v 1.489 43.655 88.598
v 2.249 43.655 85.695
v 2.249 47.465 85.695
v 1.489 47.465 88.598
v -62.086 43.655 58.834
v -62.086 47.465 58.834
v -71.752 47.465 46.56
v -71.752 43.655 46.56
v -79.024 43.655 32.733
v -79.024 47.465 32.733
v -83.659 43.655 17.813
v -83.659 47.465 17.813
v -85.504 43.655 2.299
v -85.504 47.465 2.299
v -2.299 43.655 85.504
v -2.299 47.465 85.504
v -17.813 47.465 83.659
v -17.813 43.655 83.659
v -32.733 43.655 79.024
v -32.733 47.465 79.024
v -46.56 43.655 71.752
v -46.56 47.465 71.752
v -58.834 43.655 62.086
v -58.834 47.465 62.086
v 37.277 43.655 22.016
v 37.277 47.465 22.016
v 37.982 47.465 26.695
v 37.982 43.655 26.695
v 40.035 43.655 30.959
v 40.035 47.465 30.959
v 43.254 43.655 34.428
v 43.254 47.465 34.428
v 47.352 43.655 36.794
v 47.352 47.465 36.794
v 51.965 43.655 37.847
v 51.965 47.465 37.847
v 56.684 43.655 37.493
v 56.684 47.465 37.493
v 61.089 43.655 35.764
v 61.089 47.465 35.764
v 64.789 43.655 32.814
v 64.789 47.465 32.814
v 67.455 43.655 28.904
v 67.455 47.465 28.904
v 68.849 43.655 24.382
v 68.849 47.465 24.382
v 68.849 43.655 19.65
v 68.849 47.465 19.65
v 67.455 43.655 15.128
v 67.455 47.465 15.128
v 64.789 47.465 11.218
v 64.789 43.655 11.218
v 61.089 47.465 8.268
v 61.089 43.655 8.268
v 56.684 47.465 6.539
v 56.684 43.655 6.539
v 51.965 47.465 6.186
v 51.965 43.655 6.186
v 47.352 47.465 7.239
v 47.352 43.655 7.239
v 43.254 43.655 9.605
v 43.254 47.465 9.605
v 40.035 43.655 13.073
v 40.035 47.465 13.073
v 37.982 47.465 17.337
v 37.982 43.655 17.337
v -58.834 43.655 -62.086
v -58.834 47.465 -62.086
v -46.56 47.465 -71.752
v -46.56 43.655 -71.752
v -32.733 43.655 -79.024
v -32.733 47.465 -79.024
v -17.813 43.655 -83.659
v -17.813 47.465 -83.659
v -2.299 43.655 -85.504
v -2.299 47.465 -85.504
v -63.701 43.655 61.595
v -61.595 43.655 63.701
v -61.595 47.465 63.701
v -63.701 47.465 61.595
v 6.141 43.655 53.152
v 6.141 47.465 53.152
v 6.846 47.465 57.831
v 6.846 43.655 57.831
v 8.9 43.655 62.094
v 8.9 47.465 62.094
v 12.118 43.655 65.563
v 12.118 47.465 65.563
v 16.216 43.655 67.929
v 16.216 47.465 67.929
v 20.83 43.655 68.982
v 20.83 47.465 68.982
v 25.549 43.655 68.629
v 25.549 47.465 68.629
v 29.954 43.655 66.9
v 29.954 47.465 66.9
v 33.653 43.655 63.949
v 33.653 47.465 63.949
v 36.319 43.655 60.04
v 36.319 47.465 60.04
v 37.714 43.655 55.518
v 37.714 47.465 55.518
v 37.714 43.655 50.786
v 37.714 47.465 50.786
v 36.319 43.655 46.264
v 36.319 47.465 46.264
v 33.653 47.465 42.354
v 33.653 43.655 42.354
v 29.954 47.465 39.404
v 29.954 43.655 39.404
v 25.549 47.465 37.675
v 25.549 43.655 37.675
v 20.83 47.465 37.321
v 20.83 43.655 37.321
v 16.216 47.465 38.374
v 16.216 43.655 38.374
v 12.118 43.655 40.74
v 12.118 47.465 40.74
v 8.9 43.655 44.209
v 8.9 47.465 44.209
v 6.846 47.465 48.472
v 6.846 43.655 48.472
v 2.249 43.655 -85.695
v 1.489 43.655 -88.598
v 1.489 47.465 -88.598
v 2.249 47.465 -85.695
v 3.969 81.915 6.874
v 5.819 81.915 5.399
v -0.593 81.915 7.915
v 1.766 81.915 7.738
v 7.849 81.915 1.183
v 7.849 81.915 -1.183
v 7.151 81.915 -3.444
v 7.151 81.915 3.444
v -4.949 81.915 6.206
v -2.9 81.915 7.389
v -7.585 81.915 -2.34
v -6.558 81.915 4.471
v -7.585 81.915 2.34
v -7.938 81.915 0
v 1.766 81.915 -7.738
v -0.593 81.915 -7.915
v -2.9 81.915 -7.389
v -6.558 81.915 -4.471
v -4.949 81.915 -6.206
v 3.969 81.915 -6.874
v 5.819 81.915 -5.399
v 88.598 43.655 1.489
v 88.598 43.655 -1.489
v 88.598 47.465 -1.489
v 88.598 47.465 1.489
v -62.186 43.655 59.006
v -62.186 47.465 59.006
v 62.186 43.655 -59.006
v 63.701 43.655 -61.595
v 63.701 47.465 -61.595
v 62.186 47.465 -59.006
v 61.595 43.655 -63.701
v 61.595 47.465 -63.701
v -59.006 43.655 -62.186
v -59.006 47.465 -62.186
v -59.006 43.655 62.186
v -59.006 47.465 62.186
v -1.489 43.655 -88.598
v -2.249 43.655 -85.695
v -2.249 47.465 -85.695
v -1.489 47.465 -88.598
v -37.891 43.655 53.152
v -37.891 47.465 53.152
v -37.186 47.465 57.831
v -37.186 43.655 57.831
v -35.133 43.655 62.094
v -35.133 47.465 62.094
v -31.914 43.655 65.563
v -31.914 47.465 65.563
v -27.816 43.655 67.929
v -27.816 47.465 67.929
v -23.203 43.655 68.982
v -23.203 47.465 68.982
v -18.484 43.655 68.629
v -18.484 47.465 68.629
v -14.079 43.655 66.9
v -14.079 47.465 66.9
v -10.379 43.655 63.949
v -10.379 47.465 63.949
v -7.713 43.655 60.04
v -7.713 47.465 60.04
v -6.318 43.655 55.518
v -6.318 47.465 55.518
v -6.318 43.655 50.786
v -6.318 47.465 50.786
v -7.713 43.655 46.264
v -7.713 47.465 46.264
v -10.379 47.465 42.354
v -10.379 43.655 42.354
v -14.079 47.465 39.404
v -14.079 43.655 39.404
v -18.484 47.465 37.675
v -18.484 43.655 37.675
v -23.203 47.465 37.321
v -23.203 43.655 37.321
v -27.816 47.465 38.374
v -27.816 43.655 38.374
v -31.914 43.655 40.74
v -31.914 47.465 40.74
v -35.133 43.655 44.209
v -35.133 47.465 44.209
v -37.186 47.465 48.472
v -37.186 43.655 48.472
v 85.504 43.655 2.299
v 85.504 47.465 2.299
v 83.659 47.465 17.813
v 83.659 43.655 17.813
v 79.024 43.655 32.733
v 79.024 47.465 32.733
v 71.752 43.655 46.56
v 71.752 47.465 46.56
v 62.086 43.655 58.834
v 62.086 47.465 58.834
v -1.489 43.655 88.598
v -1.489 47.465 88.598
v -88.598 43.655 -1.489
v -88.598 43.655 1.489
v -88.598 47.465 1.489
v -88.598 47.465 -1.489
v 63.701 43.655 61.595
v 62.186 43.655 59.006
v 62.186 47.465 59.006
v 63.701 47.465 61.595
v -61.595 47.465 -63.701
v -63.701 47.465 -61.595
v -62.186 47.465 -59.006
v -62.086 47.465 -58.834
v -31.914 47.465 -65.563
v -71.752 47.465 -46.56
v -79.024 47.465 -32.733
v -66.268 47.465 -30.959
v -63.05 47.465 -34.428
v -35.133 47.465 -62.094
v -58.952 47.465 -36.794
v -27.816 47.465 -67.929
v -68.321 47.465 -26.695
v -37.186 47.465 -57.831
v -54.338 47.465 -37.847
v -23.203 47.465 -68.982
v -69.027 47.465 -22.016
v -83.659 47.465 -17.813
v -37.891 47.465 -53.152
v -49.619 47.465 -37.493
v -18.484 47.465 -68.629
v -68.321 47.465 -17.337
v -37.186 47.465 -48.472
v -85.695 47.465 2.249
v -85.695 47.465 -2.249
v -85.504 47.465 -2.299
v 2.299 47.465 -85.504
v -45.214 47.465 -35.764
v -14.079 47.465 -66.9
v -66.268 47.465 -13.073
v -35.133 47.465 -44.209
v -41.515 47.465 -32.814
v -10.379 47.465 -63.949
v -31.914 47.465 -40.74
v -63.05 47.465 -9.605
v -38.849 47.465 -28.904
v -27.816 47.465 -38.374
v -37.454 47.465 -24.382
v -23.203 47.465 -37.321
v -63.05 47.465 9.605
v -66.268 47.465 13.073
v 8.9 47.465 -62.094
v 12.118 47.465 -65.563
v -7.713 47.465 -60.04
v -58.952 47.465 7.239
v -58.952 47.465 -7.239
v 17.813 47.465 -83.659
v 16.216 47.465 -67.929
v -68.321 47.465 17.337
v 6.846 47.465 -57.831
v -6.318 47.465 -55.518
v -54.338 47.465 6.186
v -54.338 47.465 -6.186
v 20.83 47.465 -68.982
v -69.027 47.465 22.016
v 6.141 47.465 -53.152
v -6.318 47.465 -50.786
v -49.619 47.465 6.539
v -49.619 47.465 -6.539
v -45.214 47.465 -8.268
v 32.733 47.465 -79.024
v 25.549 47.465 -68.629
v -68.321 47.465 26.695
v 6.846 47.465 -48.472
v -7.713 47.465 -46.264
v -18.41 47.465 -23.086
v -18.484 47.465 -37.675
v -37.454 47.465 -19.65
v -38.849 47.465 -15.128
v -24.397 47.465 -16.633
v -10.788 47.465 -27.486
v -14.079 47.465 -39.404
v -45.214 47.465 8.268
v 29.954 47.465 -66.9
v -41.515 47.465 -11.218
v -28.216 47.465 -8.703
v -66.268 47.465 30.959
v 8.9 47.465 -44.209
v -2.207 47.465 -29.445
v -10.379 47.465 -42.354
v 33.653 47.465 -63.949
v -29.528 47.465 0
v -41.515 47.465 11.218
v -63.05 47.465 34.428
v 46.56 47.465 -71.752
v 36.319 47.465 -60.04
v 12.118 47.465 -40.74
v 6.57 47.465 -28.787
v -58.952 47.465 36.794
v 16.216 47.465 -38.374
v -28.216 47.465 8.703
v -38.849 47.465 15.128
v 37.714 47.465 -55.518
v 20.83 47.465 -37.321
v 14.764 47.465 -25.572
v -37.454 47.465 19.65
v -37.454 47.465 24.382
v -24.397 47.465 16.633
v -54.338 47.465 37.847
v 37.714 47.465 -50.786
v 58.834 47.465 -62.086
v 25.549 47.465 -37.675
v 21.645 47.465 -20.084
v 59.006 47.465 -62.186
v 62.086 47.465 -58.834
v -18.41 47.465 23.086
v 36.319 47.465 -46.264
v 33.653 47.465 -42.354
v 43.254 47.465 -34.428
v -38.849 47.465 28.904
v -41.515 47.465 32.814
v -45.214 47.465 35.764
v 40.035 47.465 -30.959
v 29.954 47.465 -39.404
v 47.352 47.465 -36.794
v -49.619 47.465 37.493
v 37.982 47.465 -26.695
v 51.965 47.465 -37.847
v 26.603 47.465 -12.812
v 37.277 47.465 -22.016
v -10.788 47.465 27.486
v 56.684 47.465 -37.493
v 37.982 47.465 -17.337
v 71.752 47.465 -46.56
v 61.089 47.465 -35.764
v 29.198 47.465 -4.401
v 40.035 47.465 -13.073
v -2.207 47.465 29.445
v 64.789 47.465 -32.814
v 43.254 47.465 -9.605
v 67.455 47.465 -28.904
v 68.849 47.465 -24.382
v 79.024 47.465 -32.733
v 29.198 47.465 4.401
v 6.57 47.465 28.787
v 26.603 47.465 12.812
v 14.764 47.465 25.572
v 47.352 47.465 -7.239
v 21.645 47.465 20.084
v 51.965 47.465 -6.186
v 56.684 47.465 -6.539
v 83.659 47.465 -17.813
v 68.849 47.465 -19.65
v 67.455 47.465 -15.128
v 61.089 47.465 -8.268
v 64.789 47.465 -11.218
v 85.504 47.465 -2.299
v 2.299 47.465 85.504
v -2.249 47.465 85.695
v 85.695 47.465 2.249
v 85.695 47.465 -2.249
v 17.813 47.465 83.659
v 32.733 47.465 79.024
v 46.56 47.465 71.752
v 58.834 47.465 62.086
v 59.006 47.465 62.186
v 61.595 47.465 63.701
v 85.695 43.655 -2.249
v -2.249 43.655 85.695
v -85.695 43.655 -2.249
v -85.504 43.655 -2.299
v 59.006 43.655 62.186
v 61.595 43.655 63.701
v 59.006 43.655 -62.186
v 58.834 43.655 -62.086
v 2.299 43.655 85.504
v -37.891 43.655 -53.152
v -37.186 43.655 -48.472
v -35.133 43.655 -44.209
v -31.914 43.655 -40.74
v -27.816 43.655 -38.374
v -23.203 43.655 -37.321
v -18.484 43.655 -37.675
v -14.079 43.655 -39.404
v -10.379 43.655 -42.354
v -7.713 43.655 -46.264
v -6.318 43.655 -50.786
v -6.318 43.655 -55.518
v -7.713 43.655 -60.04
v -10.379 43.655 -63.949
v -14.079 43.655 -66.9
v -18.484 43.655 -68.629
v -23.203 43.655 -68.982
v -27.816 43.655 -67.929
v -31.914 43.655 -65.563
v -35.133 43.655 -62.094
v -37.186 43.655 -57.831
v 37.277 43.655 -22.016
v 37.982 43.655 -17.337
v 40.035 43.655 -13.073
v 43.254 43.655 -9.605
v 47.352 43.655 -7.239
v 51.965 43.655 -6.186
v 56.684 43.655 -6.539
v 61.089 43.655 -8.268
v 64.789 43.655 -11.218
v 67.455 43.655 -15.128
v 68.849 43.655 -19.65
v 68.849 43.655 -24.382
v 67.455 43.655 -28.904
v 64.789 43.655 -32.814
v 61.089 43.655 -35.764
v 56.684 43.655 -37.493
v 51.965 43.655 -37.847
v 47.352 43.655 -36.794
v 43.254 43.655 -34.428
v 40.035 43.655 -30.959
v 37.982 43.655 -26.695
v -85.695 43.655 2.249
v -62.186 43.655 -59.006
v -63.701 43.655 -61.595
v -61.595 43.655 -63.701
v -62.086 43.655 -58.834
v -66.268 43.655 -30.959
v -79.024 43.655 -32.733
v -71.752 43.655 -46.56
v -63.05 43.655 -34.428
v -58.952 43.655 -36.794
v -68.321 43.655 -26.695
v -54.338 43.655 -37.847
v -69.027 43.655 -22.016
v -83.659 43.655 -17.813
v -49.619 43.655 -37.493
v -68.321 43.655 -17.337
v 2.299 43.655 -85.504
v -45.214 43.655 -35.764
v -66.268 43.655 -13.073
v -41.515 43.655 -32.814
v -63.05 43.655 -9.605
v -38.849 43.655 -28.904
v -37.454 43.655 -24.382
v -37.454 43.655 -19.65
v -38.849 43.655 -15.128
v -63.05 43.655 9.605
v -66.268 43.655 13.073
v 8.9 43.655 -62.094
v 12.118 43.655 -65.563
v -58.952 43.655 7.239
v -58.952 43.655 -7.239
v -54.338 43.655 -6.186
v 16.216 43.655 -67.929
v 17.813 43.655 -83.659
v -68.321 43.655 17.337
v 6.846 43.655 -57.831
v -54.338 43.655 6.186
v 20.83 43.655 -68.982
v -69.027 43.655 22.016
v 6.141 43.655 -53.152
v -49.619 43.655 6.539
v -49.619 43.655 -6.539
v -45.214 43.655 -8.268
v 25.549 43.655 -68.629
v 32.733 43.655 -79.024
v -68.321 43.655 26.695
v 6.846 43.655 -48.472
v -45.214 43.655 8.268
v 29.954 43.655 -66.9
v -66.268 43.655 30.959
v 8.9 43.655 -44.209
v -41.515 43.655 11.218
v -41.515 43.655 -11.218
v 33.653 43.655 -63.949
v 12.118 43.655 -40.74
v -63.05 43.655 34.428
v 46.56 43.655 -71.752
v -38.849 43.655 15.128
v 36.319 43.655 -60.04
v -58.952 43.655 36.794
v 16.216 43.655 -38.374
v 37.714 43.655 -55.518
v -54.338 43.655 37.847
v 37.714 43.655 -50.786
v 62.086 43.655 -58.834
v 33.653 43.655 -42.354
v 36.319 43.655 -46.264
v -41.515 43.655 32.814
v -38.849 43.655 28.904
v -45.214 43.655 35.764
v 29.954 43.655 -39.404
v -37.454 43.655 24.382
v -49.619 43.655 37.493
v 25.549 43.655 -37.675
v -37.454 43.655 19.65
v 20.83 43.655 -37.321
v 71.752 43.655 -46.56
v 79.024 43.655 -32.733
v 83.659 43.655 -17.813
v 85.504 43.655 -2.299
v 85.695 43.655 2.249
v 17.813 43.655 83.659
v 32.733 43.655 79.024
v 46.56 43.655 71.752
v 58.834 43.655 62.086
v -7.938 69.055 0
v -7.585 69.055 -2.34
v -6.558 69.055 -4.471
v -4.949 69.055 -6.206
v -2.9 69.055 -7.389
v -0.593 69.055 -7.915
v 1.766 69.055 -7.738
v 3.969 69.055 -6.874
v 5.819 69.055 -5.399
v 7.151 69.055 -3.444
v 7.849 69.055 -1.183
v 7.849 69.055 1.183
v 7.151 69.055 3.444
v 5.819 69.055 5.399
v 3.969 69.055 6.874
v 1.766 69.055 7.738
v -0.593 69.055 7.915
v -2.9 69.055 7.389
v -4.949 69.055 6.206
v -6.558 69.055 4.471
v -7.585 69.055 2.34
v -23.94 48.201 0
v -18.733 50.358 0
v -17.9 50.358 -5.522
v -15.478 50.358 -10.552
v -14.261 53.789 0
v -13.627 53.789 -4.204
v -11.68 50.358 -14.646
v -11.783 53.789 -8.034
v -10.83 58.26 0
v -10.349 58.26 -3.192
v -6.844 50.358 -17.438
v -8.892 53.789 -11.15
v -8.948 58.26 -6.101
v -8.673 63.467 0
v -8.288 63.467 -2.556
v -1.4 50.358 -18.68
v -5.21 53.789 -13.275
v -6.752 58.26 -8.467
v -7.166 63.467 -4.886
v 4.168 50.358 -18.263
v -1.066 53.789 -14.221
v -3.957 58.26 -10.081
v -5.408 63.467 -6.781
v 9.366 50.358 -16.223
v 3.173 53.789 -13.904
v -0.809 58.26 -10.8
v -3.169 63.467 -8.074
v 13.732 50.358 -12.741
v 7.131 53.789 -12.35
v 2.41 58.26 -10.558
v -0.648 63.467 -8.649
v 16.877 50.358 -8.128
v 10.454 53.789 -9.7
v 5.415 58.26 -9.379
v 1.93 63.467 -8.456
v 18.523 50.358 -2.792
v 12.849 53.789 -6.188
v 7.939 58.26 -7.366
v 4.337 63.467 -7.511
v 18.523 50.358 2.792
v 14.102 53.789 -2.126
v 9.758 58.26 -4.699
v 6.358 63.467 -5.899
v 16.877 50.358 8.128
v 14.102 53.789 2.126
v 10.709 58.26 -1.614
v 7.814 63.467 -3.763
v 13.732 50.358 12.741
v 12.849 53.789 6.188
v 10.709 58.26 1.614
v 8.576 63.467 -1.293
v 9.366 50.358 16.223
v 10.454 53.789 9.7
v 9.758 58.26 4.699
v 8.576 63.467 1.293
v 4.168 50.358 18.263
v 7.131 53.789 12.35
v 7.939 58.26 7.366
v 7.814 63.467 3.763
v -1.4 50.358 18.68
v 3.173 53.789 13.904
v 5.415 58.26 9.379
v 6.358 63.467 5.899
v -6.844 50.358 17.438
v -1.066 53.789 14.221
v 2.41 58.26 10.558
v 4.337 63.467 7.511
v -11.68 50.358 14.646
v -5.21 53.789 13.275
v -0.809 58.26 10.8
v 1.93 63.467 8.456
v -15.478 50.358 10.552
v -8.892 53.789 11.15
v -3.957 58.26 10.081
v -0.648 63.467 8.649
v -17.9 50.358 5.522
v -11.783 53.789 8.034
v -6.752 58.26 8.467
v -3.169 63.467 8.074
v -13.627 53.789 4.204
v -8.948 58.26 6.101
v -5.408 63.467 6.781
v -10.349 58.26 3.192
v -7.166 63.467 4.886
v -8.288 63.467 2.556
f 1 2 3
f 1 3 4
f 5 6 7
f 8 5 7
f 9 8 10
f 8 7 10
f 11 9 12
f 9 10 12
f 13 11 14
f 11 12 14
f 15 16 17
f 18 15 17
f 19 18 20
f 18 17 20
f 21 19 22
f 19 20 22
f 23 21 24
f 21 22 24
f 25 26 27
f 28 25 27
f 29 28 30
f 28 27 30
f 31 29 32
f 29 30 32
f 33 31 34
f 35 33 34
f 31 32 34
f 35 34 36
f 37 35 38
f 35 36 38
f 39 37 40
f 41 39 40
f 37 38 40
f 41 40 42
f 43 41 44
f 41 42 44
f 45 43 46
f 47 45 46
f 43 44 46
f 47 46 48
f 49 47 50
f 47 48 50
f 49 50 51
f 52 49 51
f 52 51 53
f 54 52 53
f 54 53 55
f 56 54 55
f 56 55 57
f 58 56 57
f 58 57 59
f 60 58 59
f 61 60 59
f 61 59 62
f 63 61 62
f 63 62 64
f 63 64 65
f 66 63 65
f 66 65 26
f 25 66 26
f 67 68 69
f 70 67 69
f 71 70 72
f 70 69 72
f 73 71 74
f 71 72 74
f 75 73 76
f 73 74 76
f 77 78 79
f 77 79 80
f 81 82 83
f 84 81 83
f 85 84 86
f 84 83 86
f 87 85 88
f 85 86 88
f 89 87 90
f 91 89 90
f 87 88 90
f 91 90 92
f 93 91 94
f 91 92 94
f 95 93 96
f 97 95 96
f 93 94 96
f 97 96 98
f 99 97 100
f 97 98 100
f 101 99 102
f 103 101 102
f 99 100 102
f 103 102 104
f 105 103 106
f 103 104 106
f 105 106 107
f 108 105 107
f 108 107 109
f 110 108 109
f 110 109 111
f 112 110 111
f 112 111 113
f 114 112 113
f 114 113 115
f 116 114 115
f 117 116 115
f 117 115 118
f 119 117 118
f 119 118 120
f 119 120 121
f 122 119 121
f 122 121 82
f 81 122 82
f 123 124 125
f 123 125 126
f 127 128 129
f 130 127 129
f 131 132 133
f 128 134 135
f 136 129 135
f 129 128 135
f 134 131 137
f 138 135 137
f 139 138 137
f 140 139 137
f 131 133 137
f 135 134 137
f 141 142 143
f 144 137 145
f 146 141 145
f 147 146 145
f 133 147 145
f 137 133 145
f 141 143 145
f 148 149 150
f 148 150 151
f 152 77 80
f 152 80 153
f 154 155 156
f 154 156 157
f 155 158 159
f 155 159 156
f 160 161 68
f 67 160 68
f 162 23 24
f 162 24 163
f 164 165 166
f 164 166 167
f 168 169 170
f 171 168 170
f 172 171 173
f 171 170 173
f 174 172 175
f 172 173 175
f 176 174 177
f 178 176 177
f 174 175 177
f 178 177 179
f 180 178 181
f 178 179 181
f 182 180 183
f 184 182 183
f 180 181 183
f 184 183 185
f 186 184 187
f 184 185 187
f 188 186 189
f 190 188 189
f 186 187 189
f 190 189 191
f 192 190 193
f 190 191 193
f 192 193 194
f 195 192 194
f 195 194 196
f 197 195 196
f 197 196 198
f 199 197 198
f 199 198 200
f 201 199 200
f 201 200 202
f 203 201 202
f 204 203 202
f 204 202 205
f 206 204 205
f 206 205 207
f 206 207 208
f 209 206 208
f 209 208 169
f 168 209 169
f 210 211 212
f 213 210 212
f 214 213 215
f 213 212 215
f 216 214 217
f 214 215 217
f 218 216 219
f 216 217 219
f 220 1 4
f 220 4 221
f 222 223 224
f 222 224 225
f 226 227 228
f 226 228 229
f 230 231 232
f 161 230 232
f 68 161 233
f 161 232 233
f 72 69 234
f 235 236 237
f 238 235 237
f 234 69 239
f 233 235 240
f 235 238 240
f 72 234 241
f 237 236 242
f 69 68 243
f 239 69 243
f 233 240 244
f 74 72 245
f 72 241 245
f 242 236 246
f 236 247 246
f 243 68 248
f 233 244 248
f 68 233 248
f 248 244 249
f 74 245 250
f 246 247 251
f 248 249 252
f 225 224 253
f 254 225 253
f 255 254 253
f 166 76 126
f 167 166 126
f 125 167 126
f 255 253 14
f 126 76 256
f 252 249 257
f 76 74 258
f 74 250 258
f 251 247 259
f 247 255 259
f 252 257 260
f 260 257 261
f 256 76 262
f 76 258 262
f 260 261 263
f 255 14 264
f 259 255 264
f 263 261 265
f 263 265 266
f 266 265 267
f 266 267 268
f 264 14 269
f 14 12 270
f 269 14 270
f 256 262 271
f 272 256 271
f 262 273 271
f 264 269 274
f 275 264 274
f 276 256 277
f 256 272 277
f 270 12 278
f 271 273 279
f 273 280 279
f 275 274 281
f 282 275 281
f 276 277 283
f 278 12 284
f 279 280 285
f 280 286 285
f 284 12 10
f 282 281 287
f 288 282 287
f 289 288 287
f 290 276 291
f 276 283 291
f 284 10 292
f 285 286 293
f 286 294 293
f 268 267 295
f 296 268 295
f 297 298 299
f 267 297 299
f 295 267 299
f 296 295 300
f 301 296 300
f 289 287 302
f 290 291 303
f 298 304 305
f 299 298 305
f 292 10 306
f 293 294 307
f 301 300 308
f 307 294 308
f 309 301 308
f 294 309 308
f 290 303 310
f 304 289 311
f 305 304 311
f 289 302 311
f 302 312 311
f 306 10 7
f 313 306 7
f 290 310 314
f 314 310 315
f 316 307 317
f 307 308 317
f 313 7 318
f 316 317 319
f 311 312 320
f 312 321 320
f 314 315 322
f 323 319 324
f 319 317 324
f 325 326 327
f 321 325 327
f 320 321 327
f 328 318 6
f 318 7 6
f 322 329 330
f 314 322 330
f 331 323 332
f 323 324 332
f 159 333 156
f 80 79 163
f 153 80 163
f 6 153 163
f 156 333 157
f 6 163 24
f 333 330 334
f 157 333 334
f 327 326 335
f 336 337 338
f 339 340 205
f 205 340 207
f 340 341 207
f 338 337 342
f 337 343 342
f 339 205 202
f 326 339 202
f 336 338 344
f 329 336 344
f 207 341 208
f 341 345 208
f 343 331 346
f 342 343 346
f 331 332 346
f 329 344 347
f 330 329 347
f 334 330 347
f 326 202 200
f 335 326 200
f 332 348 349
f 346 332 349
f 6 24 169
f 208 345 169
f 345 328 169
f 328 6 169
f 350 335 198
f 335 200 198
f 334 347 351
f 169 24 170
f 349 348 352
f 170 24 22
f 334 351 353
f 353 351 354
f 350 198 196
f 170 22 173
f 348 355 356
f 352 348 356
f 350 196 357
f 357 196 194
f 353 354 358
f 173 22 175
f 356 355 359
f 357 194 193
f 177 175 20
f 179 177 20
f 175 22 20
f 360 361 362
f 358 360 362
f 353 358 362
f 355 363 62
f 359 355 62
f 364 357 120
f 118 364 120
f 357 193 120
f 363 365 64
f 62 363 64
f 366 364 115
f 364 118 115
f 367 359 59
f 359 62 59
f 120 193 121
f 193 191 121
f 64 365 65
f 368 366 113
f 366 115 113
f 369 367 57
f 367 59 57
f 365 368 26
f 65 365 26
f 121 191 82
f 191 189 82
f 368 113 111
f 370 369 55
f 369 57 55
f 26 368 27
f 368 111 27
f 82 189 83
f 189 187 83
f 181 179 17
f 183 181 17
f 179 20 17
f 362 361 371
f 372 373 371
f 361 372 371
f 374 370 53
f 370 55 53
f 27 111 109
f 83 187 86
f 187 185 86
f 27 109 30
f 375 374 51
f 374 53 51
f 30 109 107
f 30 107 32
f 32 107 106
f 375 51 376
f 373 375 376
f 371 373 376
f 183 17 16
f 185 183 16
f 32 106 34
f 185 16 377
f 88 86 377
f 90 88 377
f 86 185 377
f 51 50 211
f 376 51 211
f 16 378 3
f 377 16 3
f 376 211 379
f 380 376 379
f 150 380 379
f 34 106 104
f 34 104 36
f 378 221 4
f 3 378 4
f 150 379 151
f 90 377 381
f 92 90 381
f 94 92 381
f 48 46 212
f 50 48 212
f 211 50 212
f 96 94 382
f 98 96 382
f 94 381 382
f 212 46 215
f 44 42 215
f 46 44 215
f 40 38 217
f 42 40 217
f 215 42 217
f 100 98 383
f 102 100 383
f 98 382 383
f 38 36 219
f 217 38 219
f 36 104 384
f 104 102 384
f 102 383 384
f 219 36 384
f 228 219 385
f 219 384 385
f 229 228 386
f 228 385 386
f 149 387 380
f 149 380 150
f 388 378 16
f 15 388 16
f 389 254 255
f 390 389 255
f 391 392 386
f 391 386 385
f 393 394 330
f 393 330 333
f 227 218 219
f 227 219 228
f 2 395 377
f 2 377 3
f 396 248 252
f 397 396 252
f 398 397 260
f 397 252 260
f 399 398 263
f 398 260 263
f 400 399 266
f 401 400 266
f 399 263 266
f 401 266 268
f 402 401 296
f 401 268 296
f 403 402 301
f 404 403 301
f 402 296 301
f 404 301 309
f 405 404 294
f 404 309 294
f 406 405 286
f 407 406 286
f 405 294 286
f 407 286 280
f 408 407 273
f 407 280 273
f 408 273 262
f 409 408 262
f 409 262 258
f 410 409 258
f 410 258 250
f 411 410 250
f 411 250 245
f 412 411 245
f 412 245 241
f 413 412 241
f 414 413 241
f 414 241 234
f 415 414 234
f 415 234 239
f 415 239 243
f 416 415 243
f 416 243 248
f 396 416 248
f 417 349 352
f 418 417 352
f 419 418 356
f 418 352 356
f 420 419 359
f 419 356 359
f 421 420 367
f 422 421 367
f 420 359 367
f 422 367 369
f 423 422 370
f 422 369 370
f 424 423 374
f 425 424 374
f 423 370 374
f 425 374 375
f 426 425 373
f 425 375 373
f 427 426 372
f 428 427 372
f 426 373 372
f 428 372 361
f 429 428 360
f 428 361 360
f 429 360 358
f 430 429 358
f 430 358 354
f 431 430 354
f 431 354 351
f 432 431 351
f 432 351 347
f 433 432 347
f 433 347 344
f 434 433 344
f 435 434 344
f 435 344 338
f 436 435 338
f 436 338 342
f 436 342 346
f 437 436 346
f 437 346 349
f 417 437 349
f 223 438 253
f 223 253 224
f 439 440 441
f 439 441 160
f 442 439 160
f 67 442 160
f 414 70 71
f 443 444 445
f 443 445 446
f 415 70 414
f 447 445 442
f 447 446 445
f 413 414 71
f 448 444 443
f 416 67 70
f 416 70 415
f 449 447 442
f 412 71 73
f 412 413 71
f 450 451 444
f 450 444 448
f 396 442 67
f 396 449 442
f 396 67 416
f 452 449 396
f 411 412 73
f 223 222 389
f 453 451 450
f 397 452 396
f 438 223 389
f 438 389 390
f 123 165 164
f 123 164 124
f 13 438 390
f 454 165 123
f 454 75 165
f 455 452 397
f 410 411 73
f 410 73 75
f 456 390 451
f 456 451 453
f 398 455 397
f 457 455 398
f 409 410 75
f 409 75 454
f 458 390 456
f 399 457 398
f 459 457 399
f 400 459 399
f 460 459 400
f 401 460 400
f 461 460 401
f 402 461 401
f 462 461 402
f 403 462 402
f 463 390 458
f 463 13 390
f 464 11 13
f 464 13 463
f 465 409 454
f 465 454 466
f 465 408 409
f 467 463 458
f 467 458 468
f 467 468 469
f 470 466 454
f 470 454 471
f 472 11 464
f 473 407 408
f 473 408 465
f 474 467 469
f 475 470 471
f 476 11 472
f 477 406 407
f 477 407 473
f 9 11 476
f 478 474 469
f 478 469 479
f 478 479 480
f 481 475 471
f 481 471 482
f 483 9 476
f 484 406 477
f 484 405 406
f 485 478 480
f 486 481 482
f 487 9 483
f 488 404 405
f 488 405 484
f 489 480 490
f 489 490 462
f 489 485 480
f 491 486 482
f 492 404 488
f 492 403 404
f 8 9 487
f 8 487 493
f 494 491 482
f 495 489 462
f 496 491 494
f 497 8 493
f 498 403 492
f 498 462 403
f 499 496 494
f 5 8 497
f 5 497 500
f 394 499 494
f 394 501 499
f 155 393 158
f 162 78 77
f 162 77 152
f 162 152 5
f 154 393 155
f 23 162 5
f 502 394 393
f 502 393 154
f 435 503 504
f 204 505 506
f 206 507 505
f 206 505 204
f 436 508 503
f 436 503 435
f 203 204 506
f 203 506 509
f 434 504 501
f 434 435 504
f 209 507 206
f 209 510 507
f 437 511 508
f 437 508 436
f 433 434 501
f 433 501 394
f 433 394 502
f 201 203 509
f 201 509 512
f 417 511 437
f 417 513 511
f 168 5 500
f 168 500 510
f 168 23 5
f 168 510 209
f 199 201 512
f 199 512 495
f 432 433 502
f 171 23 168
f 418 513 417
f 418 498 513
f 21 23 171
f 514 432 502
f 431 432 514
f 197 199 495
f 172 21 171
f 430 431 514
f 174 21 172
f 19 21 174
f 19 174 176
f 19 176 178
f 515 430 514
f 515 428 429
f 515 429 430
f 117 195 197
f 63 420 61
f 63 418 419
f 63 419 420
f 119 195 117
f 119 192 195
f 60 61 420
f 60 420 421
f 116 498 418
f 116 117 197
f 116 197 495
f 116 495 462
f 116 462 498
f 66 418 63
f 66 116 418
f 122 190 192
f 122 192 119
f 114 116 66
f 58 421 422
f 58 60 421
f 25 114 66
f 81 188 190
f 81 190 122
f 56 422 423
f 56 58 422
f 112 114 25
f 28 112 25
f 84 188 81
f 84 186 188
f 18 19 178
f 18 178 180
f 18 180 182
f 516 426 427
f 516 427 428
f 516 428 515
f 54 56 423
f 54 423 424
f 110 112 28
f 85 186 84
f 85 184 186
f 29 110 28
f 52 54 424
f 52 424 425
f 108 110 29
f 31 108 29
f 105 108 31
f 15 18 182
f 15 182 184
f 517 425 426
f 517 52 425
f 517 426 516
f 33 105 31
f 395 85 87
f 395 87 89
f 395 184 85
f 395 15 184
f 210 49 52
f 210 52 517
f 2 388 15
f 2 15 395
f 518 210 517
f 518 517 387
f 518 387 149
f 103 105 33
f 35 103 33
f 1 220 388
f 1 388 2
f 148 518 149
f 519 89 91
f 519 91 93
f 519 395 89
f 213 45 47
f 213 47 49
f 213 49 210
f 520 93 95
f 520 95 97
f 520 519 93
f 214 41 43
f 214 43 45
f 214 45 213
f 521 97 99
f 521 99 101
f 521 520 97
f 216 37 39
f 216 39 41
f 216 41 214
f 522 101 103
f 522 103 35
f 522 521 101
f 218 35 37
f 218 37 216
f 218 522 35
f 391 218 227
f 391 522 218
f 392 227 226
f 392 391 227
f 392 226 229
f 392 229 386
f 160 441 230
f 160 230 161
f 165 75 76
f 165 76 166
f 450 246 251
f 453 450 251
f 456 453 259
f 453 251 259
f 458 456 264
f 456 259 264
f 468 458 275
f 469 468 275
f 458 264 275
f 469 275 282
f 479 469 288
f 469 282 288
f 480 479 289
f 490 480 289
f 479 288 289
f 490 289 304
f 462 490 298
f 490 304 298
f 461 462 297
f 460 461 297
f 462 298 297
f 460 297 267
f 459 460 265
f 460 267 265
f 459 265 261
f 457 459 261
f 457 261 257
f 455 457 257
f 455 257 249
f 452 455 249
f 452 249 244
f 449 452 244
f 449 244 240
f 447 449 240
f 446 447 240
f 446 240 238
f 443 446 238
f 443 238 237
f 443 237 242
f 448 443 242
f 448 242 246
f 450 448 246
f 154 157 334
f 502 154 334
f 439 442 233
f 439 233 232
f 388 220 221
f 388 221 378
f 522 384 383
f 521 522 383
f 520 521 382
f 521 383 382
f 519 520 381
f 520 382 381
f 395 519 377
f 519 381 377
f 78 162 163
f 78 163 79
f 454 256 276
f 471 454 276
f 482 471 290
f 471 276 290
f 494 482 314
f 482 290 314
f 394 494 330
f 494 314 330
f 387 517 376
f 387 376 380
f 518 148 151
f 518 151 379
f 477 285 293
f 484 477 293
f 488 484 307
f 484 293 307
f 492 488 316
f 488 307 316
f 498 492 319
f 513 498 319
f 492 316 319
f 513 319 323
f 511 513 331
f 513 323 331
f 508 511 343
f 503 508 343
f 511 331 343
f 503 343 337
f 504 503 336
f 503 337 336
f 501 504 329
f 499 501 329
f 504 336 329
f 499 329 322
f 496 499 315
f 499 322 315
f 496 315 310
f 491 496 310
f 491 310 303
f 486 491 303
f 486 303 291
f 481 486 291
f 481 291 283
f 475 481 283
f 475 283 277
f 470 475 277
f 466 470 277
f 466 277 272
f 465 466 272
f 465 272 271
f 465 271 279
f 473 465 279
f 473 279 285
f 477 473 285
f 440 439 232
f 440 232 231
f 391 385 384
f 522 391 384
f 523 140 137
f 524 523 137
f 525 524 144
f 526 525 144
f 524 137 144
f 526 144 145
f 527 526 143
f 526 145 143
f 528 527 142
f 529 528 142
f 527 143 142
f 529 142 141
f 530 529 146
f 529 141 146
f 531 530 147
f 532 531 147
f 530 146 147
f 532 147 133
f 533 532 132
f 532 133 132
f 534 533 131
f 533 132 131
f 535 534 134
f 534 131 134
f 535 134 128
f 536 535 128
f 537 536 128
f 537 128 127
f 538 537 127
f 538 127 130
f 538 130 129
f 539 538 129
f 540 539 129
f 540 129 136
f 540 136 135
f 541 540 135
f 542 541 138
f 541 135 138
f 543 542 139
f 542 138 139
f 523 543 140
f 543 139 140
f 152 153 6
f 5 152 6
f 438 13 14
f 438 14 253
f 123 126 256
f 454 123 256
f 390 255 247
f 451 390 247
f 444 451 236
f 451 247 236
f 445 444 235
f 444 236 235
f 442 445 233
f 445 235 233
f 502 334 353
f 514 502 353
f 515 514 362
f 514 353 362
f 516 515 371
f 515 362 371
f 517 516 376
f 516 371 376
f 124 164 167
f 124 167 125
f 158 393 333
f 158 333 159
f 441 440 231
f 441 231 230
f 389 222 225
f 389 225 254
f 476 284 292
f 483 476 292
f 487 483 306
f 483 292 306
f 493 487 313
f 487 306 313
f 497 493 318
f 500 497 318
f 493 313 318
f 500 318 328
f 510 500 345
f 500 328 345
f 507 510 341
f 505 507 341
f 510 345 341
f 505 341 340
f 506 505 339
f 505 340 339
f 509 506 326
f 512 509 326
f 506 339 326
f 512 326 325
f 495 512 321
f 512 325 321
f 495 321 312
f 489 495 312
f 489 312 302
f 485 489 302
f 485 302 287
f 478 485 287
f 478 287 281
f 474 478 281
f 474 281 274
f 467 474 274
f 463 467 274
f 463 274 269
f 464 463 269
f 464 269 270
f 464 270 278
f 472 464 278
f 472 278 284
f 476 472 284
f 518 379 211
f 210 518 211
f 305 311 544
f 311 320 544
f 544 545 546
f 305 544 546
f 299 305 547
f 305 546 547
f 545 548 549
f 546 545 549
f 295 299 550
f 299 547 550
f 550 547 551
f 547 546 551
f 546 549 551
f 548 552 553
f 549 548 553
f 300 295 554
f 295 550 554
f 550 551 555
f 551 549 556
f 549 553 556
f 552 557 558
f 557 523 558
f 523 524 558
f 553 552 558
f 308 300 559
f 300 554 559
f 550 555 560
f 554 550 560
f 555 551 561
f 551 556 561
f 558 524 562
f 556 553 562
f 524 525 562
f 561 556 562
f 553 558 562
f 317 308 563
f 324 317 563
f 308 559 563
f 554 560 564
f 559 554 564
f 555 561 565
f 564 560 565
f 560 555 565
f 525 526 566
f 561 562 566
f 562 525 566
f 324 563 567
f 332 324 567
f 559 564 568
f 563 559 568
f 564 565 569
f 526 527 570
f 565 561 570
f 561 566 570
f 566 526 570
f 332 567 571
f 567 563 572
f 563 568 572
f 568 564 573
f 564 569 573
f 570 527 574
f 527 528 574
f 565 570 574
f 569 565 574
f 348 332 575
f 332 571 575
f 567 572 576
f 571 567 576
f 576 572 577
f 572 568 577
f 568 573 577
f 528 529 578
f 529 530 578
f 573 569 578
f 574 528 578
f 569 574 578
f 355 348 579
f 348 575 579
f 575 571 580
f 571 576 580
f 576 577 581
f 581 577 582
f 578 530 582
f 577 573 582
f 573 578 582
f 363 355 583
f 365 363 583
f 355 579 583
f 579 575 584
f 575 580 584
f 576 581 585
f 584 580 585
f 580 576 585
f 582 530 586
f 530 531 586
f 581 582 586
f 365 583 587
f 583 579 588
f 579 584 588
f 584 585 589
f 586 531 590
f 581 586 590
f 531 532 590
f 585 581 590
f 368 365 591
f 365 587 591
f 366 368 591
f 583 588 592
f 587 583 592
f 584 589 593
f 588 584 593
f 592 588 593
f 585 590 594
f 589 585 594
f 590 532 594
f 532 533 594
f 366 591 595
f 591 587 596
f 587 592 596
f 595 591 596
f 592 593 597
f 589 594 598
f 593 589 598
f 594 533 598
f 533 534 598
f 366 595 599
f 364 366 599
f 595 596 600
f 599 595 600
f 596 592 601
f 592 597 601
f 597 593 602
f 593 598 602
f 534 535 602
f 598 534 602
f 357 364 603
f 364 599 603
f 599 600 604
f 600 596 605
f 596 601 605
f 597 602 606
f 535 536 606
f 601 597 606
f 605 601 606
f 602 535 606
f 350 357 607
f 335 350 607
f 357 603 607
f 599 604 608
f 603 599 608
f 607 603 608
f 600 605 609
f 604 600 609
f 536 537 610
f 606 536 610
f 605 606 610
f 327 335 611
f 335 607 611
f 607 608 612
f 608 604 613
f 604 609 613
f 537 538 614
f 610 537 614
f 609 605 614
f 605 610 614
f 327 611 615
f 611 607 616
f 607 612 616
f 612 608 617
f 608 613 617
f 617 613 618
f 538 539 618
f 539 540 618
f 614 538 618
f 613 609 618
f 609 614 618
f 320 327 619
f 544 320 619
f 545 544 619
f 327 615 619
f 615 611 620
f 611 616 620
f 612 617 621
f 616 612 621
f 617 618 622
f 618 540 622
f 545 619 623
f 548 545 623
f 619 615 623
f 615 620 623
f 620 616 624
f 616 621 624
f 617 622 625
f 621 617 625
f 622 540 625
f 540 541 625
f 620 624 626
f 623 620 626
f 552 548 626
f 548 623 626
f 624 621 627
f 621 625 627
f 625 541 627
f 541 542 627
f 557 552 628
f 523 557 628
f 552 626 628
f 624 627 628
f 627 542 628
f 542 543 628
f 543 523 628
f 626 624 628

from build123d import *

# Parameters (mm, degrees)
SKETCH1_R            = 85.725
BOSS_EXTRUDE1_DEPTH  = 62.865
FILLET1_R            = 3.175
FILLET1_OF_MIRROR1_R = 3.175
FILLET2_R            = 21.59
CUT_EXTRUDE2_START   = 34.45
SKETCH5_R            = 92.075
SKETCH5_R_2          = 85.725
CUT_EXTRUDE2_DEPTH   = 219.00798967
SKETCH6_W            = 171.45
SKETCH6_H            = 25.581957496
CUT_EXTRUDE3_DEPTH   = 88.9
BOSS_EXTRUDE2_START  = -94.93
BOSS_EXTRUDE2_DEPTH  = 3.81
CUT_EXTRUDE5_DEPTH   = 130.946195435
SKETCH9_R            = 15.875
CUT_EXTRUDE6_DEPTH   = 130.946195435


with BuildPart() as part:
    # Sketch1 → Boss-Extrude1 (new, symmetric)
    with BuildSketch(Plane(origin=(0, 0, 0), x_dir=(1, 0, 0), z_dir=(0, 1, 0))):
        with BuildLine():
            Line((13.371386035, 89.497618576), (13.619190523, 91.06219454))
            ThreePointArc((13.619190523, 91.06219454), (7.224121239, 91.791163503), (0.79375, 92.0715786))
            Line((0.79375, 92.0715786), (0.79375, 90.4875))
            Line((0.79375, 90.4875), (-0.79375, 90.4875))
            Line((-0.79375, 90.4875), (-0.79375, 92.0715786))
            ThreePointArc((-0.79375, 92.0715786), (-7.224121239, 91.791163503), (-13.619190523, 91.06219454))
            Line((-13.619190523, 91.06219454), (-13.371386035, 89.497618576))
            Line((-13.371386035, 89.497618576), (-14.939341276, 89.249278863))
            Line((-14.939341276, 89.249278863), (-15.187145764, 90.813854827))
            ThreePointArc((-15.187145764, 90.813854827), (-21.494481877, 89.530960421), (-27.696781377, 87.810557033))
            Line((-27.696781377, 87.810557033), (-27.207274169, 86.304008758))
            Line((-27.207274169, 86.304008758), (-28.717076388, 85.813444279))
            Line((-28.717076388, 85.813444279), (-29.206583596, 87.319992554))
            ThreePointArc((-29.206583596, 87.319992554), (-35.235577035, 85.066207956), (-41.092385552, 82.396732184))
            Line((-41.092385552, 82.396732184), (-40.373228917, 80.985307817))
            Line((-40.373228917, 80.985307817), (-41.787701774, 80.264597898))
            Line((-41.787701774, 80.264597898), (-42.506858409, 81.676022266))
            ThreePointArc((-42.506858409, 81.676022266), (-48.109055346, 78.506843133), (-53.476158817, 74.954026331))
            Line((-53.476158817, 74.954026331), (-52.545060778, 73.672479823))
            Line((-52.545060778, 73.672479823), (-53.829375256, 72.739370734))
            Line((-53.829375256, 72.739370734), (-54.760473296, 74.020917243))
            ThreePointArc((-54.760473296, 74.020917243), (-59.79792905, 70.014379283), (-64.543171575, 65.66570359))
            Line((-64.543171575, 65.66570359), (-63.423058855, 64.54559087))
            Line((-63.423058855, 64.54559087), (-64.54559087, 63.423058855))
            Line((-64.54559087, 63.423058855), (-65.66570359, 64.543171575))
            ThreePointArc((-65.66570359, 64.543171575), (-70.014379283, 59.79792905), (-74.020917243, 54.760473296))
            Line((-74.020917243, 54.760473296), (-72.739370734, 53.829375256))
            Line((-72.739370734, 53.829375256), (-73.672479823, 52.545060778))
            Line((-73.672479823, 52.545060778), (-74.954026331, 53.476158817))
            ThreePointArc((-74.954026331, 53.476158817), (-78.506843133, 48.109055346), (-81.676022266, 42.506858409))
            Line((-81.676022266, 42.506858409), (-80.264597898, 41.787701774))
            Line((-80.264597898, 41.787701774), (-80.985307817, 40.373228917))
            Line((-80.985307817, 40.373228917), (-82.396732184, 41.092385552))
            ThreePointArc((-82.396732184, 41.092385552), (-85.066207956, 35.235577035), (-87.319992554, 29.206583596))
            Line((-87.319992554, 29.206583596), (-85.813444279, 28.717076388))
            Line((-85.813444279, 28.717076388), (-86.304008758, 27.207274169))
            Line((-86.304008758, 27.207274169), (-87.810557033, 27.696781377))
            ThreePointArc((-87.810557033, 27.696781377), (-89.530960421, 21.494481877), (-90.813854827, 15.187145764))
            Line((-90.813854827, 15.187145764), (-89.249278863, 14.939341276))
            Line((-89.249278863, 14.939341276), (-89.497618576, 13.371386035))
            Line((-89.497618576, 13.371386035), (-91.06219454, 13.619190523))
            ThreePointArc((-91.06219454, 13.619190523), (-91.791163503, 7.224121239), (-92.0715786, 0.79375))
            Line((-92.0715786, 0.79375), (-90.4875, 0.79375))
            Line((-90.4875, 0.79375), (-90.4875, -0.79375))
            Line((-90.4875, -0.79375), (-92.0715786, -0.79375))
            ThreePointArc((-92.0715786, -0.79375), (-91.791163503, -7.224121239), (-91.06219454, -13.619190523))
            Line((-91.06219454, -13.619190523), (-89.497618576, -13.371386035))
            Line((-89.497618576, -13.371386035), (-89.249278863, -14.939341276))
            Line((-89.249278863, -14.939341276), (-90.813854827, -15.187145764))
            ThreePointArc((-90.813854827, -15.187145764), (-89.530960421, -21.494481877), (-87.810557033, -27.696781377))
            Line((-87.810557033, -27.696781377), (-86.304008758, -27.207274169))
            Line((-86.304008758, -27.207274169), (-85.813444279, -28.717076388))
            Line((-85.813444279, -28.717076388), (-87.319992554, -29.206583596))
            ThreePointArc((-87.319992554, -29.206583596), (-85.066207956, -35.235577035), (-82.396732184, -41.092385552))
            Line((-82.396732184, -41.092385552), (-80.985307817, -40.373228917))
            Line((-80.985307817, -40.373228917), (-80.264597898, -41.787701774))
            Line((-80.264597898, -41.787701774), (-81.676022266, -42.506858409))
            ThreePointArc((-81.676022266, -42.506858409), (-78.506843133, -48.109055346), (-74.954026331, -53.476158817))
            Line((-74.954026331, -53.476158817), (-73.672479822, -52.545060778))
            Line((-73.672479822, -52.545060778), (-72.739370734, -53.829375256))
            Line((-72.739370734, -53.829375256), (-74.020917242, -54.760473296))
            ThreePointArc((-74.020917242, -54.760473296), (-70.014379283, -59.79792905), (-65.66570359, -64.543171575))
            Line((-65.66570359, -64.543171575), (-64.54559087, -63.423058855))
            Line((-64.54559087, -63.423058855), (-63.423058855, -64.54559087))
            Line((-63.423058855, -64.54559087), (-64.543171575, -65.66570359))
            ThreePointArc((-64.543171575, -65.66570359), (-59.79792905, -70.014379283), (-54.760473296, -74.020917243))
            Line((-54.760473296, -74.020917243), (-53.829375256, -72.739370735))
            Line((-53.829375256, -72.739370735), (-52.545060778, -73.672479823))
            Line((-52.545060778, -73.672479823), (-53.476158817, -74.954026331))
            ThreePointArc((-53.476158817, -74.954026331), (-48.109055346, -78.506843133), (-42.506858409, -81.676022266))
            Line((-42.506858409, -81.676022266), (-41.787701774, -80.264597898))
            Line((-41.787701774, -80.264597898), (-40.373228917, -80.985307817))
            Line((-40.373228917, -80.985307817), (-41.092385552, -82.396732184))
            ThreePointArc((-41.092385552, -82.396732184), (-35.235577035, -85.066207956), (-29.206583596, -87.319992554))
            Line((-29.206583596, -87.319992554), (-28.717076388, -85.813444279))
            Line((-28.717076388, -85.813444279), (-27.207274169, -86.304008758))
            Line((-27.207274169, -86.304008758), (-27.696781377, -87.810557033))
            ThreePointArc((-27.696781377, -87.810557033), (-21.494481877, -89.530960421), (-15.187145764, -90.813854827))
            Line((-15.187145764, -90.813854827), (-14.939341276, -89.249278863))
            Line((-14.939341276, -89.249278863), (-13.371386035, -89.497618576))
            Line((-13.371386035, -89.497618576), (-13.619190523, -91.06219454))
            ThreePointArc((-13.619190523, -91.06219454), (-7.224121239, -91.791163503), (-0.79375, -92.0715786))
            Line((-0.79375, -92.0715786), (-0.79375, -90.4875))
            Line((-0.79375, -90.4875), (0.79375, -90.4875))
            Line((0.79375, -90.4875), (0.79375, -92.0715786))
            ThreePointArc((0.79375, -92.0715786), (7.224121239, -91.791163503), (13.619190523, -91.06219454))
            Line((13.619190523, -91.06219454), (13.371386035, -89.497618576))
            Line((13.371386035, -89.497618576), (14.939341276, -89.249278863))
            Line((14.939341276, -89.249278863), (15.187145764, -90.813854827))
            ThreePointArc((15.187145764, -90.813854827), (21.494481877, -89.530960421), (27.696781377, -87.810557033))
            Line((27.696781377, -87.810557033), (27.207274169, -86.304008758))
            Line((27.207274169, -86.304008758), (28.717076388, -85.813444279))
            Line((28.717076388, -85.813444279), (29.206583596, -87.319992554))
            ThreePointArc((29.206583596, -87.319992554), (35.235577035, -85.066207956), (41.092385552, -82.396732184))
            Line((41.092385552, -82.396732184), (40.373228917, -80.985307817))
            Line((40.373228917, -80.985307817), (41.787701774, -80.264597898))
            Line((41.787701774, -80.264597898), (42.506858409, -81.676022266))
            ThreePointArc((42.506858409, -81.676022266), (48.109055346, -78.506843133), (53.476158817, -74.954026331))
            Line((53.476158817, -74.954026331), (52.545060778, -73.672479823))
            Line((52.545060778, -73.672479823), (53.829375256, -72.739370734))
            Line((53.829375256, -72.739370734), (54.760473296, -74.020917242))
            ThreePointArc((54.760473296, -74.020917242), (59.79792905, -70.014379283), (64.543171575, -65.66570359))
            Line((64.543171575, -65.66570359), (63.423058855, -64.54559087))
            Line((63.423058855, -64.54559087), (64.54559087, -63.423058855))
            Line((64.54559087, -63.423058855), (65.66570359, -64.543171575))
            ThreePointArc((65.66570359, -64.543171575), (70.014379283, -59.79792905), (74.020917243, -54.760473296))
            Line((74.020917243, -54.760473296), (72.739370735, -53.829375256))
            Line((72.739370735, -53.829375256), (73.672479823, -52.545060778))
            Line((73.672479823, -52.545060778), (74.954026331, -53.476158817))
            ThreePointArc((74.954026331, -53.476158817), (78.506843133, -48.109055346), (81.676022266, -42.506858409))
            Line((81.676022266, -42.506858409), (80.264597898, -41.787701774))
            Line((80.264597898, -41.787701774), (80.985307817, -40.373228917))
            Line((80.985307817, -40.373228917), (82.396732184, -41.092385552))
            ThreePointArc((82.396732184, -41.092385552), (85.066207956, -35.235577035), (87.319992554, -29.206583596))
            Line((87.319992554, -29.206583596), (85.813444279, -28.717076388))
            Line((85.813444279, -28.717076388), (86.304008758, -27.207274169))
            Line((86.304008758, -27.207274169), (87.810557033, -27.696781377))
            ThreePointArc((87.810557033, -27.696781377), (89.530960421, -21.494481877), (90.813854827, -15.187145764))
            Line((90.813854827, -15.187145764), (89.249278863, -14.939341276))
            Line((89.249278863, -14.939341276), (89.497618576, -13.371386035))
            Line((89.497618576, -13.371386035), (91.06219454, -13.619190523))
            ThreePointArc((91.06219454, -13.619190523), (91.791163503, -7.224121239), (92.0715786, -0.79375))
            Line((92.0715786, -0.79375), (90.4875, -0.79375))
            Line((90.4875, -0.79375), (90.4875, 0.79375))
            Line((90.4875, 0.79375), (92.0715786, 0.79375))
            ThreePointArc((92.0715786, 0.79375), (91.791163503, 7.224121239), (91.06219454, 13.619190523))
            Line((91.06219454, 13.619190523), (89.497618576, 13.371386035))
            Line((89.497618576, 13.371386035), (89.249278863, 14.939341276))
            Line((89.249278863, 14.939341276), (90.813854827, 15.187145764))
            ThreePointArc((90.813854827, 15.187145764), (89.530960421, 21.494481877), (87.810557033, 27.696781377))
            Line((87.810557033, 27.696781377), (86.304008758, 27.207274169))
            Line((86.304008758, 27.207274169), (85.813444279, 28.717076388))
            Line((85.813444279, 28.717076388), (87.319992554, 29.206583596))
            ThreePointArc((87.319992554, 29.206583596), (85.066207956, 35.235577035), (82.396732184, 41.092385552))
            Line((82.396732184, 41.092385552), (80.985307817, 40.373228917))
            Line((80.985307817, 40.373228917), (80.264597898, 41.787701774))
            Line((80.264597898, 41.787701774), (81.676022266, 42.506858409))
            ThreePointArc((81.676022266, 42.506858409), (78.506843133, 48.109055346), (74.954026331, 53.476158817))
            Line((74.954026331, 53.476158817), (73.672479823, 52.545060778))
            Line((73.672479823, 52.545060778), (72.739370735, 53.829375256))
            Line((72.739370735, 53.829375256), (74.020917243, 54.760473296))
            ThreePointArc((74.020917243, 54.760473296), (70.014379283, 59.79792905), (65.66570359, 64.543171575))
            Line((65.66570359, 64.543171575), (64.54559087, 63.423058855))
            Line((64.54559087, 63.423058855), (63.423058855, 64.54559087))
            Line((63.423058855, 64.54559087), (64.543171575, 65.66570359))
            ThreePointArc((64.543171575, 65.66570359), (59.79792905, 70.014379283), (54.760473296, 74.020917243))
            Line((54.760473296, 74.020917243), (53.829375256, 72.739370735))
            Line((53.829375256, 72.739370735), (52.545060778, 73.672479823))
            Line((52.545060778, 73.672479823), (53.476158817, 74.954026331))
            ThreePointArc((53.476158817, 74.954026331), (48.109055346, 78.506843133), (42.506858409, 81.676022266))
            Line((42.506858409, 81.676022266), (41.787701774, 80.264597898))
            Line((41.787701774, 80.264597898), (40.373228917, 80.985307817))
            Line((40.373228917, 80.985307817), (41.092385552, 82.396732184))
            ThreePointArc((41.092385552, 82.396732184), (35.235577035, 85.066207956), (29.206583596, 87.319992554))
            Line((29.206583596, 87.319992554), (28.717076388, 85.813444279))
            Line((28.717076388, 85.813444279), (27.207274169, 86.304008758))
            Line((27.207274169, 86.304008758), (27.696781377, 87.810557033))
            ThreePointArc((27.696781377, 87.810557033), (21.494481877, 89.530960421), (15.187145764, 90.813854827))
            Line((15.187145764, 90.813854827), (14.939341276, 89.249278863))
            Line((14.939341276, 89.249278863), (13.371386035, 89.497618576))
        make_face()
        with Locations(Location((0, 0, 0), (0, 0, 270))):
            Circle(SKETCH1_R, mode=Mode.SUBTRACT)
    extrude(amount=BOSS_EXTRUDE1_DEPTH, both=True)

    # Sketch2 → Revolve1 (revolve)
    with BuildSketch(Plane.XY):
        Polygon((0, 81.915), (0, 41.115), (-85.725, 41.115), (-85.725, 47.465), (-7.9375, 47.465), (-7.9375, 81.915), align=None)
    revolve1 = revolve(axis=Axis((0, 81.915, 0), (0, -1, 0)))

    # Fillet1
    fillet1_edges = [part.edges().sort_by_distance(p)[0] for p in [
        (0, 41.115, -85.725),
    ]]
    fillet(fillet1_edges, radius=FILLET1_R)

    # Mirror1: Revolve1 across plane
    add(revolve1.mirror(Plane.ZX))

    # Fillet1 of Mirror1
    fillet1_of_mirror1_edges = [part.edges().sort_by_distance(p)[0] for p in [
        (0, -41.115, -85.725),
    ]]
    fillet(fillet1_of_mirror1_edges, radius=FILLET1_OF_MIRROR1_R)

    # Fillet2
    fillet2_edges = [part.edges().sort_by_distance(p)[0] for p in [
        (7.9375, 47.465, 0),
        (7.9375, -47.465, 0),
    ]]
    fillet(fillet2_edges, radius=FILLET2_R)

    # Sketch5 → Cut-Extrude2 (cut, through all)
    with BuildSketch(Plane.XZ.offset(47.465).offset(CUT_EXTRUDE2_START)):
        Circle(SKETCH5_R)
        Circle(SKETCH5_R_2, mode=Mode.SUBTRACT)
    extrude(amount=-CUT_EXTRUDE2_DEPTH, mode=Mode.SUBTRACT)


with BuildPart() as cut_extrude2_kept_piece:
    # of the separate pieces the step leaves, the one the design keeps (cut_extrude2_pieces_kept)
    add(part.part.solids().sort_by_distance((-29.5275, 47.465, 0))[0])

    # Sketch6 → Cut-Extrude3 (cut, symmetric)
    with BuildSketch(Plane.XY):
        with Locations((0, 30.864021252)):
            Rectangle(SKETCH6_W, SKETCH6_H)
    extrude(amount=CUT_EXTRUDE3_DEPTH, both=True, mode=Mode.SUBTRACT)

    # Sketch5<5> → Boss-Extrude2 (add)
    with BuildSketch(Plane.XZ.offset(47.465).offset(BOSS_EXTRUDE2_START)):
        with BuildLine():
            Line((1.489458784, -88.598), (2.249038414, -85.695492596))
            ThreePointArc((2.249038414, -85.695492596), (0, -85.725), (-2.249038414, -85.695492596))
            Line((-2.249038414, -85.695492596), (-1.489458784, -88.598))
            Line((-1.489458784, -88.598), (1.489458784, -88.598))
        make_face()
        with BuildLine():
            Line((-61.595040193, -63.701453006), (-59.005553618, -62.186174245))
            ThreePointArc((-59.005553618, -62.186174245), (-60.616728817, -60.616728817), (-62.186174245, -59.005553618))
            Line((-62.186174245, -59.005553618), (-63.701453006, -61.595040193))
            Line((-63.701453006, -61.595040193), (-61.595040193, -63.701453006))
        make_face()
        with BuildLine():
            ThreePointArc((-85.695492596, -2.249038414), (-85.725, 0), (-85.695492596, 2.249038414))
            Line((-85.695492596, 2.249038414), (-88.598, 1.489458784))
            Line((-88.598, 1.489458784), (-88.598, -1.489458784))
            Line((-88.598, -1.489458784), (-85.695492596, -2.249038414))
        make_face()
        with BuildLine():
            ThreePointArc((-62.186174245, 59.005553618), (-60.616728817, 60.616728817), (-59.005553618, 62.186174245))
            Line((-59.005553618, 62.186174245), (-61.595040193, 63.701453006))
            Line((-61.595040193, 63.701453006), (-63.701453006, 61.595040193))
            Line((-63.701453006, 61.595040193), (-62.186174245, 59.005553618))
        make_face()
        with BuildLine():
            ThreePointArc((-2.249038414, 85.695492596), (0, 85.725), (2.249038414, 85.695492596))
            Line((2.249038414, 85.695492596), (1.489458784, 88.598))
            Line((1.489458784, 88.598), (-1.489458784, 88.598))
            Line((-1.489458784, 88.598), (-2.249038414, 85.695492596))
        make_face()
        with BuildLine():
            ThreePointArc((59.005553618, 62.186174245), (60.616728817, 60.616728817), (62.186174245, 59.005553618))
            Line((62.186174245, 59.005553618), (63.701453006, 61.595040193))
            Line((63.701453006, 61.595040193), (61.595040193, 63.701453006))
            Line((61.595040193, 63.701453006), (59.005553618, 62.186174245))
        make_face()
        with BuildLine():
            Line((88.598, 1.489458784), (85.695492596, 2.249038414))
            ThreePointArc((85.695492596, 2.249038414), (85.717622831, 1.124615987), (85.725, 0))
            ThreePointArc((85.725, 0), (85.717622831, -1.124615987), (85.695492596, -2.249038414))
            Line((85.695492596, -2.249038414), (88.598, -1.489458784))
            Line((88.598, -1.489458784), (88.598, 1.489458784))
        make_face()
        with BuildLine():
            Line((63.701453006, -61.595040193), (62.186174245, -59.005553618))
            ThreePointArc((62.186174245, -59.005553618), (60.616728817, -60.616728817), (59.005553618, -62.186174245))
            Line((59.005553618, -62.186174245), (61.595040193, -63.701453006))
            Line((61.595040193, -63.701453006), (63.701453006, -61.595040193))
        make_face()
    extrude(amount=BOSS_EXTRUDE2_DEPTH)

    # Sketch8 → Cut-Extrude5 (cut, through all)
    with BuildSketch(Plane(origin=(0, 47.465, 0), x_dir=(1, 0, 0), z_dir=(0, 1, 0))):
        with BuildLine():
            Line((-85.503591154, -2.299258587), (-85.695492596, -2.249038414))
            ThreePointArc((-85.695492596, -2.249038414), (-79.199572925, -32.805537239), (-62.186174245, -59.005553618))
            Line((-62.186174245, -59.005553618), (-62.08599046, -58.834347782))
            ThreePointArc((-62.08599046, -58.834347782), (-79.023573874, -32.732636046), (-85.503591154, -2.299258587))
        make_face()
        with BuildLine():
            ThreePointArc((-2.299258587, -85.503591154), (-32.732636046, -79.023573874), (-58.834347782, -62.08599046))
            Line((-58.834347782, -62.08599046), (-59.005553618, -62.186174245))
            ThreePointArc((-59.005553618, -62.186174245), (-32.805537239, -79.199572925), (-2.249038414, -85.695492596))
            Line((-2.249038414, -85.695492596), (-2.299258587, -85.503591154))
        make_face()
        with BuildLine():
            ThreePointArc((58.834347782, -62.08599046), (32.732636046, -79.023573874), (2.299258587, -85.503591154))
            Line((2.299258587, -85.503591154), (2.249038414, -85.695492596))
            ThreePointArc((2.249038414, -85.695492596), (32.805537239, -79.199572925), (59.005553618, -62.186174245))
            Line((59.005553618, -62.186174245), (58.834347782, -62.08599046))
        make_face()
        with BuildLine():
            ThreePointArc((85.503591154, -2.299258587), (79.023573874, -32.732636046), (62.08599046, -58.834347782))
            Line((62.08599046, -58.834347782), (62.186174245, -59.005553618))
            ThreePointArc((62.186174245, -59.005553618), (79.199572925, -32.805537239), (85.695492596, -2.249038414))
            Line((85.695492596, -2.249038414), (85.503591154, -2.299258587))
        make_face()
        with BuildLine():
            Line((62.186174245, 59.005553618), (62.08599046, 58.834347782))
            ThreePointArc((62.08599046, 58.834347782), (79.023573874, 32.732636046), (85.503591154, 2.299258587))
            Line((85.503591154, 2.299258587), (85.695492596, 2.249038414))
            ThreePointArc((85.695492596, 2.249038414), (79.199572925, 32.805537239), (62.186174245, 59.005553618))
        make_face()
        with BuildLine():
            Line((2.249038414, 85.695492596), (2.299258587, 85.503591154))
            ThreePointArc((2.299258587, 85.503591154), (32.732636046, 79.023573874), (58.834347782, 62.08599046))
            Line((58.834347782, 62.08599046), (59.005553618, 62.186174245))
            ThreePointArc((59.005553618, 62.186174245), (32.805537239, 79.199572925), (2.249038414, 85.695492596))
        make_face()
        with BuildLine():
            Line((-59.005553618, 62.186174245), (-58.834347782, 62.08599046))
            ThreePointArc((-58.834347782, 62.08599046), (-32.732636046, 79.023573874), (-2.299258587, 85.503591154))
            Line((-2.299258587, 85.503591154), (-2.249038414, 85.695492596))
            ThreePointArc((-2.249038414, 85.695492596), (-32.805537239, 79.199572925), (-59.005553618, 62.186174245))
        make_face()
        with BuildLine():
            Line((-85.695492596, 2.249038414), (-85.503591154, 2.299258587))
            ThreePointArc((-85.503591154, 2.299258587), (-79.023573874, 32.732636046), (-62.08599046, 58.834347782))
            Line((-62.08599046, 58.834347782), (-62.186174245, 59.005553618))
            ThreePointArc((-62.186174245, 59.005553618), (-79.199572925, 32.805537239), (-85.695492596, 2.249038414))
        make_face()
    extrude(amount=-CUT_EXTRUDE5_DEPTH, mode=Mode.SUBTRACT)

    # Sketch9 → Cut-Extrude6 (cut, through all)
    with BuildSketch(Plane(origin=(0, 47.465, 0), x_dir=(1, 0, 0), z_dir=(0, 1, 0))):
        with Locations(Location((-22.016160547, 53.151713385, 0), (0, 0, 180))):
            Circle(SKETCH9_R)
        with Locations(Location((22.016160547, 53.151713385, 0), (0, 0, 180))):
            Circle(SKETCH9_R)
        with Locations(Location((53.151713385, 22.016160547, 0), (0, 0, 180))):
            Circle(SKETCH9_R)
        with Locations(Location((53.151713385, -22.016160547, 0), (0, 0, 180))):
            Circle(SKETCH9_R)
        with Locations(Location((22.016160547, -53.151713385, 0), (0, 0, 180))):
            Circle(SKETCH9_R)
        with Locations(Location((-22.016160547, -53.151713385, 0), (0, 0, 180))):
            Circle(SKETCH9_R)
        with Locations(Location((-53.151713385, -22.016160547, 0), (0, 0, 180))):
            Circle(SKETCH9_R)
        with Locations(Location((-53.151713385, 22.016160547, 0), (0, 0, 180))):
            Circle(SKETCH9_R)
    extrude(amount=-CUT_EXTRUDE6_DEPTH, mode=Mode.SUBTRACT)


solid = cut_extrude2_kept_piece.part
